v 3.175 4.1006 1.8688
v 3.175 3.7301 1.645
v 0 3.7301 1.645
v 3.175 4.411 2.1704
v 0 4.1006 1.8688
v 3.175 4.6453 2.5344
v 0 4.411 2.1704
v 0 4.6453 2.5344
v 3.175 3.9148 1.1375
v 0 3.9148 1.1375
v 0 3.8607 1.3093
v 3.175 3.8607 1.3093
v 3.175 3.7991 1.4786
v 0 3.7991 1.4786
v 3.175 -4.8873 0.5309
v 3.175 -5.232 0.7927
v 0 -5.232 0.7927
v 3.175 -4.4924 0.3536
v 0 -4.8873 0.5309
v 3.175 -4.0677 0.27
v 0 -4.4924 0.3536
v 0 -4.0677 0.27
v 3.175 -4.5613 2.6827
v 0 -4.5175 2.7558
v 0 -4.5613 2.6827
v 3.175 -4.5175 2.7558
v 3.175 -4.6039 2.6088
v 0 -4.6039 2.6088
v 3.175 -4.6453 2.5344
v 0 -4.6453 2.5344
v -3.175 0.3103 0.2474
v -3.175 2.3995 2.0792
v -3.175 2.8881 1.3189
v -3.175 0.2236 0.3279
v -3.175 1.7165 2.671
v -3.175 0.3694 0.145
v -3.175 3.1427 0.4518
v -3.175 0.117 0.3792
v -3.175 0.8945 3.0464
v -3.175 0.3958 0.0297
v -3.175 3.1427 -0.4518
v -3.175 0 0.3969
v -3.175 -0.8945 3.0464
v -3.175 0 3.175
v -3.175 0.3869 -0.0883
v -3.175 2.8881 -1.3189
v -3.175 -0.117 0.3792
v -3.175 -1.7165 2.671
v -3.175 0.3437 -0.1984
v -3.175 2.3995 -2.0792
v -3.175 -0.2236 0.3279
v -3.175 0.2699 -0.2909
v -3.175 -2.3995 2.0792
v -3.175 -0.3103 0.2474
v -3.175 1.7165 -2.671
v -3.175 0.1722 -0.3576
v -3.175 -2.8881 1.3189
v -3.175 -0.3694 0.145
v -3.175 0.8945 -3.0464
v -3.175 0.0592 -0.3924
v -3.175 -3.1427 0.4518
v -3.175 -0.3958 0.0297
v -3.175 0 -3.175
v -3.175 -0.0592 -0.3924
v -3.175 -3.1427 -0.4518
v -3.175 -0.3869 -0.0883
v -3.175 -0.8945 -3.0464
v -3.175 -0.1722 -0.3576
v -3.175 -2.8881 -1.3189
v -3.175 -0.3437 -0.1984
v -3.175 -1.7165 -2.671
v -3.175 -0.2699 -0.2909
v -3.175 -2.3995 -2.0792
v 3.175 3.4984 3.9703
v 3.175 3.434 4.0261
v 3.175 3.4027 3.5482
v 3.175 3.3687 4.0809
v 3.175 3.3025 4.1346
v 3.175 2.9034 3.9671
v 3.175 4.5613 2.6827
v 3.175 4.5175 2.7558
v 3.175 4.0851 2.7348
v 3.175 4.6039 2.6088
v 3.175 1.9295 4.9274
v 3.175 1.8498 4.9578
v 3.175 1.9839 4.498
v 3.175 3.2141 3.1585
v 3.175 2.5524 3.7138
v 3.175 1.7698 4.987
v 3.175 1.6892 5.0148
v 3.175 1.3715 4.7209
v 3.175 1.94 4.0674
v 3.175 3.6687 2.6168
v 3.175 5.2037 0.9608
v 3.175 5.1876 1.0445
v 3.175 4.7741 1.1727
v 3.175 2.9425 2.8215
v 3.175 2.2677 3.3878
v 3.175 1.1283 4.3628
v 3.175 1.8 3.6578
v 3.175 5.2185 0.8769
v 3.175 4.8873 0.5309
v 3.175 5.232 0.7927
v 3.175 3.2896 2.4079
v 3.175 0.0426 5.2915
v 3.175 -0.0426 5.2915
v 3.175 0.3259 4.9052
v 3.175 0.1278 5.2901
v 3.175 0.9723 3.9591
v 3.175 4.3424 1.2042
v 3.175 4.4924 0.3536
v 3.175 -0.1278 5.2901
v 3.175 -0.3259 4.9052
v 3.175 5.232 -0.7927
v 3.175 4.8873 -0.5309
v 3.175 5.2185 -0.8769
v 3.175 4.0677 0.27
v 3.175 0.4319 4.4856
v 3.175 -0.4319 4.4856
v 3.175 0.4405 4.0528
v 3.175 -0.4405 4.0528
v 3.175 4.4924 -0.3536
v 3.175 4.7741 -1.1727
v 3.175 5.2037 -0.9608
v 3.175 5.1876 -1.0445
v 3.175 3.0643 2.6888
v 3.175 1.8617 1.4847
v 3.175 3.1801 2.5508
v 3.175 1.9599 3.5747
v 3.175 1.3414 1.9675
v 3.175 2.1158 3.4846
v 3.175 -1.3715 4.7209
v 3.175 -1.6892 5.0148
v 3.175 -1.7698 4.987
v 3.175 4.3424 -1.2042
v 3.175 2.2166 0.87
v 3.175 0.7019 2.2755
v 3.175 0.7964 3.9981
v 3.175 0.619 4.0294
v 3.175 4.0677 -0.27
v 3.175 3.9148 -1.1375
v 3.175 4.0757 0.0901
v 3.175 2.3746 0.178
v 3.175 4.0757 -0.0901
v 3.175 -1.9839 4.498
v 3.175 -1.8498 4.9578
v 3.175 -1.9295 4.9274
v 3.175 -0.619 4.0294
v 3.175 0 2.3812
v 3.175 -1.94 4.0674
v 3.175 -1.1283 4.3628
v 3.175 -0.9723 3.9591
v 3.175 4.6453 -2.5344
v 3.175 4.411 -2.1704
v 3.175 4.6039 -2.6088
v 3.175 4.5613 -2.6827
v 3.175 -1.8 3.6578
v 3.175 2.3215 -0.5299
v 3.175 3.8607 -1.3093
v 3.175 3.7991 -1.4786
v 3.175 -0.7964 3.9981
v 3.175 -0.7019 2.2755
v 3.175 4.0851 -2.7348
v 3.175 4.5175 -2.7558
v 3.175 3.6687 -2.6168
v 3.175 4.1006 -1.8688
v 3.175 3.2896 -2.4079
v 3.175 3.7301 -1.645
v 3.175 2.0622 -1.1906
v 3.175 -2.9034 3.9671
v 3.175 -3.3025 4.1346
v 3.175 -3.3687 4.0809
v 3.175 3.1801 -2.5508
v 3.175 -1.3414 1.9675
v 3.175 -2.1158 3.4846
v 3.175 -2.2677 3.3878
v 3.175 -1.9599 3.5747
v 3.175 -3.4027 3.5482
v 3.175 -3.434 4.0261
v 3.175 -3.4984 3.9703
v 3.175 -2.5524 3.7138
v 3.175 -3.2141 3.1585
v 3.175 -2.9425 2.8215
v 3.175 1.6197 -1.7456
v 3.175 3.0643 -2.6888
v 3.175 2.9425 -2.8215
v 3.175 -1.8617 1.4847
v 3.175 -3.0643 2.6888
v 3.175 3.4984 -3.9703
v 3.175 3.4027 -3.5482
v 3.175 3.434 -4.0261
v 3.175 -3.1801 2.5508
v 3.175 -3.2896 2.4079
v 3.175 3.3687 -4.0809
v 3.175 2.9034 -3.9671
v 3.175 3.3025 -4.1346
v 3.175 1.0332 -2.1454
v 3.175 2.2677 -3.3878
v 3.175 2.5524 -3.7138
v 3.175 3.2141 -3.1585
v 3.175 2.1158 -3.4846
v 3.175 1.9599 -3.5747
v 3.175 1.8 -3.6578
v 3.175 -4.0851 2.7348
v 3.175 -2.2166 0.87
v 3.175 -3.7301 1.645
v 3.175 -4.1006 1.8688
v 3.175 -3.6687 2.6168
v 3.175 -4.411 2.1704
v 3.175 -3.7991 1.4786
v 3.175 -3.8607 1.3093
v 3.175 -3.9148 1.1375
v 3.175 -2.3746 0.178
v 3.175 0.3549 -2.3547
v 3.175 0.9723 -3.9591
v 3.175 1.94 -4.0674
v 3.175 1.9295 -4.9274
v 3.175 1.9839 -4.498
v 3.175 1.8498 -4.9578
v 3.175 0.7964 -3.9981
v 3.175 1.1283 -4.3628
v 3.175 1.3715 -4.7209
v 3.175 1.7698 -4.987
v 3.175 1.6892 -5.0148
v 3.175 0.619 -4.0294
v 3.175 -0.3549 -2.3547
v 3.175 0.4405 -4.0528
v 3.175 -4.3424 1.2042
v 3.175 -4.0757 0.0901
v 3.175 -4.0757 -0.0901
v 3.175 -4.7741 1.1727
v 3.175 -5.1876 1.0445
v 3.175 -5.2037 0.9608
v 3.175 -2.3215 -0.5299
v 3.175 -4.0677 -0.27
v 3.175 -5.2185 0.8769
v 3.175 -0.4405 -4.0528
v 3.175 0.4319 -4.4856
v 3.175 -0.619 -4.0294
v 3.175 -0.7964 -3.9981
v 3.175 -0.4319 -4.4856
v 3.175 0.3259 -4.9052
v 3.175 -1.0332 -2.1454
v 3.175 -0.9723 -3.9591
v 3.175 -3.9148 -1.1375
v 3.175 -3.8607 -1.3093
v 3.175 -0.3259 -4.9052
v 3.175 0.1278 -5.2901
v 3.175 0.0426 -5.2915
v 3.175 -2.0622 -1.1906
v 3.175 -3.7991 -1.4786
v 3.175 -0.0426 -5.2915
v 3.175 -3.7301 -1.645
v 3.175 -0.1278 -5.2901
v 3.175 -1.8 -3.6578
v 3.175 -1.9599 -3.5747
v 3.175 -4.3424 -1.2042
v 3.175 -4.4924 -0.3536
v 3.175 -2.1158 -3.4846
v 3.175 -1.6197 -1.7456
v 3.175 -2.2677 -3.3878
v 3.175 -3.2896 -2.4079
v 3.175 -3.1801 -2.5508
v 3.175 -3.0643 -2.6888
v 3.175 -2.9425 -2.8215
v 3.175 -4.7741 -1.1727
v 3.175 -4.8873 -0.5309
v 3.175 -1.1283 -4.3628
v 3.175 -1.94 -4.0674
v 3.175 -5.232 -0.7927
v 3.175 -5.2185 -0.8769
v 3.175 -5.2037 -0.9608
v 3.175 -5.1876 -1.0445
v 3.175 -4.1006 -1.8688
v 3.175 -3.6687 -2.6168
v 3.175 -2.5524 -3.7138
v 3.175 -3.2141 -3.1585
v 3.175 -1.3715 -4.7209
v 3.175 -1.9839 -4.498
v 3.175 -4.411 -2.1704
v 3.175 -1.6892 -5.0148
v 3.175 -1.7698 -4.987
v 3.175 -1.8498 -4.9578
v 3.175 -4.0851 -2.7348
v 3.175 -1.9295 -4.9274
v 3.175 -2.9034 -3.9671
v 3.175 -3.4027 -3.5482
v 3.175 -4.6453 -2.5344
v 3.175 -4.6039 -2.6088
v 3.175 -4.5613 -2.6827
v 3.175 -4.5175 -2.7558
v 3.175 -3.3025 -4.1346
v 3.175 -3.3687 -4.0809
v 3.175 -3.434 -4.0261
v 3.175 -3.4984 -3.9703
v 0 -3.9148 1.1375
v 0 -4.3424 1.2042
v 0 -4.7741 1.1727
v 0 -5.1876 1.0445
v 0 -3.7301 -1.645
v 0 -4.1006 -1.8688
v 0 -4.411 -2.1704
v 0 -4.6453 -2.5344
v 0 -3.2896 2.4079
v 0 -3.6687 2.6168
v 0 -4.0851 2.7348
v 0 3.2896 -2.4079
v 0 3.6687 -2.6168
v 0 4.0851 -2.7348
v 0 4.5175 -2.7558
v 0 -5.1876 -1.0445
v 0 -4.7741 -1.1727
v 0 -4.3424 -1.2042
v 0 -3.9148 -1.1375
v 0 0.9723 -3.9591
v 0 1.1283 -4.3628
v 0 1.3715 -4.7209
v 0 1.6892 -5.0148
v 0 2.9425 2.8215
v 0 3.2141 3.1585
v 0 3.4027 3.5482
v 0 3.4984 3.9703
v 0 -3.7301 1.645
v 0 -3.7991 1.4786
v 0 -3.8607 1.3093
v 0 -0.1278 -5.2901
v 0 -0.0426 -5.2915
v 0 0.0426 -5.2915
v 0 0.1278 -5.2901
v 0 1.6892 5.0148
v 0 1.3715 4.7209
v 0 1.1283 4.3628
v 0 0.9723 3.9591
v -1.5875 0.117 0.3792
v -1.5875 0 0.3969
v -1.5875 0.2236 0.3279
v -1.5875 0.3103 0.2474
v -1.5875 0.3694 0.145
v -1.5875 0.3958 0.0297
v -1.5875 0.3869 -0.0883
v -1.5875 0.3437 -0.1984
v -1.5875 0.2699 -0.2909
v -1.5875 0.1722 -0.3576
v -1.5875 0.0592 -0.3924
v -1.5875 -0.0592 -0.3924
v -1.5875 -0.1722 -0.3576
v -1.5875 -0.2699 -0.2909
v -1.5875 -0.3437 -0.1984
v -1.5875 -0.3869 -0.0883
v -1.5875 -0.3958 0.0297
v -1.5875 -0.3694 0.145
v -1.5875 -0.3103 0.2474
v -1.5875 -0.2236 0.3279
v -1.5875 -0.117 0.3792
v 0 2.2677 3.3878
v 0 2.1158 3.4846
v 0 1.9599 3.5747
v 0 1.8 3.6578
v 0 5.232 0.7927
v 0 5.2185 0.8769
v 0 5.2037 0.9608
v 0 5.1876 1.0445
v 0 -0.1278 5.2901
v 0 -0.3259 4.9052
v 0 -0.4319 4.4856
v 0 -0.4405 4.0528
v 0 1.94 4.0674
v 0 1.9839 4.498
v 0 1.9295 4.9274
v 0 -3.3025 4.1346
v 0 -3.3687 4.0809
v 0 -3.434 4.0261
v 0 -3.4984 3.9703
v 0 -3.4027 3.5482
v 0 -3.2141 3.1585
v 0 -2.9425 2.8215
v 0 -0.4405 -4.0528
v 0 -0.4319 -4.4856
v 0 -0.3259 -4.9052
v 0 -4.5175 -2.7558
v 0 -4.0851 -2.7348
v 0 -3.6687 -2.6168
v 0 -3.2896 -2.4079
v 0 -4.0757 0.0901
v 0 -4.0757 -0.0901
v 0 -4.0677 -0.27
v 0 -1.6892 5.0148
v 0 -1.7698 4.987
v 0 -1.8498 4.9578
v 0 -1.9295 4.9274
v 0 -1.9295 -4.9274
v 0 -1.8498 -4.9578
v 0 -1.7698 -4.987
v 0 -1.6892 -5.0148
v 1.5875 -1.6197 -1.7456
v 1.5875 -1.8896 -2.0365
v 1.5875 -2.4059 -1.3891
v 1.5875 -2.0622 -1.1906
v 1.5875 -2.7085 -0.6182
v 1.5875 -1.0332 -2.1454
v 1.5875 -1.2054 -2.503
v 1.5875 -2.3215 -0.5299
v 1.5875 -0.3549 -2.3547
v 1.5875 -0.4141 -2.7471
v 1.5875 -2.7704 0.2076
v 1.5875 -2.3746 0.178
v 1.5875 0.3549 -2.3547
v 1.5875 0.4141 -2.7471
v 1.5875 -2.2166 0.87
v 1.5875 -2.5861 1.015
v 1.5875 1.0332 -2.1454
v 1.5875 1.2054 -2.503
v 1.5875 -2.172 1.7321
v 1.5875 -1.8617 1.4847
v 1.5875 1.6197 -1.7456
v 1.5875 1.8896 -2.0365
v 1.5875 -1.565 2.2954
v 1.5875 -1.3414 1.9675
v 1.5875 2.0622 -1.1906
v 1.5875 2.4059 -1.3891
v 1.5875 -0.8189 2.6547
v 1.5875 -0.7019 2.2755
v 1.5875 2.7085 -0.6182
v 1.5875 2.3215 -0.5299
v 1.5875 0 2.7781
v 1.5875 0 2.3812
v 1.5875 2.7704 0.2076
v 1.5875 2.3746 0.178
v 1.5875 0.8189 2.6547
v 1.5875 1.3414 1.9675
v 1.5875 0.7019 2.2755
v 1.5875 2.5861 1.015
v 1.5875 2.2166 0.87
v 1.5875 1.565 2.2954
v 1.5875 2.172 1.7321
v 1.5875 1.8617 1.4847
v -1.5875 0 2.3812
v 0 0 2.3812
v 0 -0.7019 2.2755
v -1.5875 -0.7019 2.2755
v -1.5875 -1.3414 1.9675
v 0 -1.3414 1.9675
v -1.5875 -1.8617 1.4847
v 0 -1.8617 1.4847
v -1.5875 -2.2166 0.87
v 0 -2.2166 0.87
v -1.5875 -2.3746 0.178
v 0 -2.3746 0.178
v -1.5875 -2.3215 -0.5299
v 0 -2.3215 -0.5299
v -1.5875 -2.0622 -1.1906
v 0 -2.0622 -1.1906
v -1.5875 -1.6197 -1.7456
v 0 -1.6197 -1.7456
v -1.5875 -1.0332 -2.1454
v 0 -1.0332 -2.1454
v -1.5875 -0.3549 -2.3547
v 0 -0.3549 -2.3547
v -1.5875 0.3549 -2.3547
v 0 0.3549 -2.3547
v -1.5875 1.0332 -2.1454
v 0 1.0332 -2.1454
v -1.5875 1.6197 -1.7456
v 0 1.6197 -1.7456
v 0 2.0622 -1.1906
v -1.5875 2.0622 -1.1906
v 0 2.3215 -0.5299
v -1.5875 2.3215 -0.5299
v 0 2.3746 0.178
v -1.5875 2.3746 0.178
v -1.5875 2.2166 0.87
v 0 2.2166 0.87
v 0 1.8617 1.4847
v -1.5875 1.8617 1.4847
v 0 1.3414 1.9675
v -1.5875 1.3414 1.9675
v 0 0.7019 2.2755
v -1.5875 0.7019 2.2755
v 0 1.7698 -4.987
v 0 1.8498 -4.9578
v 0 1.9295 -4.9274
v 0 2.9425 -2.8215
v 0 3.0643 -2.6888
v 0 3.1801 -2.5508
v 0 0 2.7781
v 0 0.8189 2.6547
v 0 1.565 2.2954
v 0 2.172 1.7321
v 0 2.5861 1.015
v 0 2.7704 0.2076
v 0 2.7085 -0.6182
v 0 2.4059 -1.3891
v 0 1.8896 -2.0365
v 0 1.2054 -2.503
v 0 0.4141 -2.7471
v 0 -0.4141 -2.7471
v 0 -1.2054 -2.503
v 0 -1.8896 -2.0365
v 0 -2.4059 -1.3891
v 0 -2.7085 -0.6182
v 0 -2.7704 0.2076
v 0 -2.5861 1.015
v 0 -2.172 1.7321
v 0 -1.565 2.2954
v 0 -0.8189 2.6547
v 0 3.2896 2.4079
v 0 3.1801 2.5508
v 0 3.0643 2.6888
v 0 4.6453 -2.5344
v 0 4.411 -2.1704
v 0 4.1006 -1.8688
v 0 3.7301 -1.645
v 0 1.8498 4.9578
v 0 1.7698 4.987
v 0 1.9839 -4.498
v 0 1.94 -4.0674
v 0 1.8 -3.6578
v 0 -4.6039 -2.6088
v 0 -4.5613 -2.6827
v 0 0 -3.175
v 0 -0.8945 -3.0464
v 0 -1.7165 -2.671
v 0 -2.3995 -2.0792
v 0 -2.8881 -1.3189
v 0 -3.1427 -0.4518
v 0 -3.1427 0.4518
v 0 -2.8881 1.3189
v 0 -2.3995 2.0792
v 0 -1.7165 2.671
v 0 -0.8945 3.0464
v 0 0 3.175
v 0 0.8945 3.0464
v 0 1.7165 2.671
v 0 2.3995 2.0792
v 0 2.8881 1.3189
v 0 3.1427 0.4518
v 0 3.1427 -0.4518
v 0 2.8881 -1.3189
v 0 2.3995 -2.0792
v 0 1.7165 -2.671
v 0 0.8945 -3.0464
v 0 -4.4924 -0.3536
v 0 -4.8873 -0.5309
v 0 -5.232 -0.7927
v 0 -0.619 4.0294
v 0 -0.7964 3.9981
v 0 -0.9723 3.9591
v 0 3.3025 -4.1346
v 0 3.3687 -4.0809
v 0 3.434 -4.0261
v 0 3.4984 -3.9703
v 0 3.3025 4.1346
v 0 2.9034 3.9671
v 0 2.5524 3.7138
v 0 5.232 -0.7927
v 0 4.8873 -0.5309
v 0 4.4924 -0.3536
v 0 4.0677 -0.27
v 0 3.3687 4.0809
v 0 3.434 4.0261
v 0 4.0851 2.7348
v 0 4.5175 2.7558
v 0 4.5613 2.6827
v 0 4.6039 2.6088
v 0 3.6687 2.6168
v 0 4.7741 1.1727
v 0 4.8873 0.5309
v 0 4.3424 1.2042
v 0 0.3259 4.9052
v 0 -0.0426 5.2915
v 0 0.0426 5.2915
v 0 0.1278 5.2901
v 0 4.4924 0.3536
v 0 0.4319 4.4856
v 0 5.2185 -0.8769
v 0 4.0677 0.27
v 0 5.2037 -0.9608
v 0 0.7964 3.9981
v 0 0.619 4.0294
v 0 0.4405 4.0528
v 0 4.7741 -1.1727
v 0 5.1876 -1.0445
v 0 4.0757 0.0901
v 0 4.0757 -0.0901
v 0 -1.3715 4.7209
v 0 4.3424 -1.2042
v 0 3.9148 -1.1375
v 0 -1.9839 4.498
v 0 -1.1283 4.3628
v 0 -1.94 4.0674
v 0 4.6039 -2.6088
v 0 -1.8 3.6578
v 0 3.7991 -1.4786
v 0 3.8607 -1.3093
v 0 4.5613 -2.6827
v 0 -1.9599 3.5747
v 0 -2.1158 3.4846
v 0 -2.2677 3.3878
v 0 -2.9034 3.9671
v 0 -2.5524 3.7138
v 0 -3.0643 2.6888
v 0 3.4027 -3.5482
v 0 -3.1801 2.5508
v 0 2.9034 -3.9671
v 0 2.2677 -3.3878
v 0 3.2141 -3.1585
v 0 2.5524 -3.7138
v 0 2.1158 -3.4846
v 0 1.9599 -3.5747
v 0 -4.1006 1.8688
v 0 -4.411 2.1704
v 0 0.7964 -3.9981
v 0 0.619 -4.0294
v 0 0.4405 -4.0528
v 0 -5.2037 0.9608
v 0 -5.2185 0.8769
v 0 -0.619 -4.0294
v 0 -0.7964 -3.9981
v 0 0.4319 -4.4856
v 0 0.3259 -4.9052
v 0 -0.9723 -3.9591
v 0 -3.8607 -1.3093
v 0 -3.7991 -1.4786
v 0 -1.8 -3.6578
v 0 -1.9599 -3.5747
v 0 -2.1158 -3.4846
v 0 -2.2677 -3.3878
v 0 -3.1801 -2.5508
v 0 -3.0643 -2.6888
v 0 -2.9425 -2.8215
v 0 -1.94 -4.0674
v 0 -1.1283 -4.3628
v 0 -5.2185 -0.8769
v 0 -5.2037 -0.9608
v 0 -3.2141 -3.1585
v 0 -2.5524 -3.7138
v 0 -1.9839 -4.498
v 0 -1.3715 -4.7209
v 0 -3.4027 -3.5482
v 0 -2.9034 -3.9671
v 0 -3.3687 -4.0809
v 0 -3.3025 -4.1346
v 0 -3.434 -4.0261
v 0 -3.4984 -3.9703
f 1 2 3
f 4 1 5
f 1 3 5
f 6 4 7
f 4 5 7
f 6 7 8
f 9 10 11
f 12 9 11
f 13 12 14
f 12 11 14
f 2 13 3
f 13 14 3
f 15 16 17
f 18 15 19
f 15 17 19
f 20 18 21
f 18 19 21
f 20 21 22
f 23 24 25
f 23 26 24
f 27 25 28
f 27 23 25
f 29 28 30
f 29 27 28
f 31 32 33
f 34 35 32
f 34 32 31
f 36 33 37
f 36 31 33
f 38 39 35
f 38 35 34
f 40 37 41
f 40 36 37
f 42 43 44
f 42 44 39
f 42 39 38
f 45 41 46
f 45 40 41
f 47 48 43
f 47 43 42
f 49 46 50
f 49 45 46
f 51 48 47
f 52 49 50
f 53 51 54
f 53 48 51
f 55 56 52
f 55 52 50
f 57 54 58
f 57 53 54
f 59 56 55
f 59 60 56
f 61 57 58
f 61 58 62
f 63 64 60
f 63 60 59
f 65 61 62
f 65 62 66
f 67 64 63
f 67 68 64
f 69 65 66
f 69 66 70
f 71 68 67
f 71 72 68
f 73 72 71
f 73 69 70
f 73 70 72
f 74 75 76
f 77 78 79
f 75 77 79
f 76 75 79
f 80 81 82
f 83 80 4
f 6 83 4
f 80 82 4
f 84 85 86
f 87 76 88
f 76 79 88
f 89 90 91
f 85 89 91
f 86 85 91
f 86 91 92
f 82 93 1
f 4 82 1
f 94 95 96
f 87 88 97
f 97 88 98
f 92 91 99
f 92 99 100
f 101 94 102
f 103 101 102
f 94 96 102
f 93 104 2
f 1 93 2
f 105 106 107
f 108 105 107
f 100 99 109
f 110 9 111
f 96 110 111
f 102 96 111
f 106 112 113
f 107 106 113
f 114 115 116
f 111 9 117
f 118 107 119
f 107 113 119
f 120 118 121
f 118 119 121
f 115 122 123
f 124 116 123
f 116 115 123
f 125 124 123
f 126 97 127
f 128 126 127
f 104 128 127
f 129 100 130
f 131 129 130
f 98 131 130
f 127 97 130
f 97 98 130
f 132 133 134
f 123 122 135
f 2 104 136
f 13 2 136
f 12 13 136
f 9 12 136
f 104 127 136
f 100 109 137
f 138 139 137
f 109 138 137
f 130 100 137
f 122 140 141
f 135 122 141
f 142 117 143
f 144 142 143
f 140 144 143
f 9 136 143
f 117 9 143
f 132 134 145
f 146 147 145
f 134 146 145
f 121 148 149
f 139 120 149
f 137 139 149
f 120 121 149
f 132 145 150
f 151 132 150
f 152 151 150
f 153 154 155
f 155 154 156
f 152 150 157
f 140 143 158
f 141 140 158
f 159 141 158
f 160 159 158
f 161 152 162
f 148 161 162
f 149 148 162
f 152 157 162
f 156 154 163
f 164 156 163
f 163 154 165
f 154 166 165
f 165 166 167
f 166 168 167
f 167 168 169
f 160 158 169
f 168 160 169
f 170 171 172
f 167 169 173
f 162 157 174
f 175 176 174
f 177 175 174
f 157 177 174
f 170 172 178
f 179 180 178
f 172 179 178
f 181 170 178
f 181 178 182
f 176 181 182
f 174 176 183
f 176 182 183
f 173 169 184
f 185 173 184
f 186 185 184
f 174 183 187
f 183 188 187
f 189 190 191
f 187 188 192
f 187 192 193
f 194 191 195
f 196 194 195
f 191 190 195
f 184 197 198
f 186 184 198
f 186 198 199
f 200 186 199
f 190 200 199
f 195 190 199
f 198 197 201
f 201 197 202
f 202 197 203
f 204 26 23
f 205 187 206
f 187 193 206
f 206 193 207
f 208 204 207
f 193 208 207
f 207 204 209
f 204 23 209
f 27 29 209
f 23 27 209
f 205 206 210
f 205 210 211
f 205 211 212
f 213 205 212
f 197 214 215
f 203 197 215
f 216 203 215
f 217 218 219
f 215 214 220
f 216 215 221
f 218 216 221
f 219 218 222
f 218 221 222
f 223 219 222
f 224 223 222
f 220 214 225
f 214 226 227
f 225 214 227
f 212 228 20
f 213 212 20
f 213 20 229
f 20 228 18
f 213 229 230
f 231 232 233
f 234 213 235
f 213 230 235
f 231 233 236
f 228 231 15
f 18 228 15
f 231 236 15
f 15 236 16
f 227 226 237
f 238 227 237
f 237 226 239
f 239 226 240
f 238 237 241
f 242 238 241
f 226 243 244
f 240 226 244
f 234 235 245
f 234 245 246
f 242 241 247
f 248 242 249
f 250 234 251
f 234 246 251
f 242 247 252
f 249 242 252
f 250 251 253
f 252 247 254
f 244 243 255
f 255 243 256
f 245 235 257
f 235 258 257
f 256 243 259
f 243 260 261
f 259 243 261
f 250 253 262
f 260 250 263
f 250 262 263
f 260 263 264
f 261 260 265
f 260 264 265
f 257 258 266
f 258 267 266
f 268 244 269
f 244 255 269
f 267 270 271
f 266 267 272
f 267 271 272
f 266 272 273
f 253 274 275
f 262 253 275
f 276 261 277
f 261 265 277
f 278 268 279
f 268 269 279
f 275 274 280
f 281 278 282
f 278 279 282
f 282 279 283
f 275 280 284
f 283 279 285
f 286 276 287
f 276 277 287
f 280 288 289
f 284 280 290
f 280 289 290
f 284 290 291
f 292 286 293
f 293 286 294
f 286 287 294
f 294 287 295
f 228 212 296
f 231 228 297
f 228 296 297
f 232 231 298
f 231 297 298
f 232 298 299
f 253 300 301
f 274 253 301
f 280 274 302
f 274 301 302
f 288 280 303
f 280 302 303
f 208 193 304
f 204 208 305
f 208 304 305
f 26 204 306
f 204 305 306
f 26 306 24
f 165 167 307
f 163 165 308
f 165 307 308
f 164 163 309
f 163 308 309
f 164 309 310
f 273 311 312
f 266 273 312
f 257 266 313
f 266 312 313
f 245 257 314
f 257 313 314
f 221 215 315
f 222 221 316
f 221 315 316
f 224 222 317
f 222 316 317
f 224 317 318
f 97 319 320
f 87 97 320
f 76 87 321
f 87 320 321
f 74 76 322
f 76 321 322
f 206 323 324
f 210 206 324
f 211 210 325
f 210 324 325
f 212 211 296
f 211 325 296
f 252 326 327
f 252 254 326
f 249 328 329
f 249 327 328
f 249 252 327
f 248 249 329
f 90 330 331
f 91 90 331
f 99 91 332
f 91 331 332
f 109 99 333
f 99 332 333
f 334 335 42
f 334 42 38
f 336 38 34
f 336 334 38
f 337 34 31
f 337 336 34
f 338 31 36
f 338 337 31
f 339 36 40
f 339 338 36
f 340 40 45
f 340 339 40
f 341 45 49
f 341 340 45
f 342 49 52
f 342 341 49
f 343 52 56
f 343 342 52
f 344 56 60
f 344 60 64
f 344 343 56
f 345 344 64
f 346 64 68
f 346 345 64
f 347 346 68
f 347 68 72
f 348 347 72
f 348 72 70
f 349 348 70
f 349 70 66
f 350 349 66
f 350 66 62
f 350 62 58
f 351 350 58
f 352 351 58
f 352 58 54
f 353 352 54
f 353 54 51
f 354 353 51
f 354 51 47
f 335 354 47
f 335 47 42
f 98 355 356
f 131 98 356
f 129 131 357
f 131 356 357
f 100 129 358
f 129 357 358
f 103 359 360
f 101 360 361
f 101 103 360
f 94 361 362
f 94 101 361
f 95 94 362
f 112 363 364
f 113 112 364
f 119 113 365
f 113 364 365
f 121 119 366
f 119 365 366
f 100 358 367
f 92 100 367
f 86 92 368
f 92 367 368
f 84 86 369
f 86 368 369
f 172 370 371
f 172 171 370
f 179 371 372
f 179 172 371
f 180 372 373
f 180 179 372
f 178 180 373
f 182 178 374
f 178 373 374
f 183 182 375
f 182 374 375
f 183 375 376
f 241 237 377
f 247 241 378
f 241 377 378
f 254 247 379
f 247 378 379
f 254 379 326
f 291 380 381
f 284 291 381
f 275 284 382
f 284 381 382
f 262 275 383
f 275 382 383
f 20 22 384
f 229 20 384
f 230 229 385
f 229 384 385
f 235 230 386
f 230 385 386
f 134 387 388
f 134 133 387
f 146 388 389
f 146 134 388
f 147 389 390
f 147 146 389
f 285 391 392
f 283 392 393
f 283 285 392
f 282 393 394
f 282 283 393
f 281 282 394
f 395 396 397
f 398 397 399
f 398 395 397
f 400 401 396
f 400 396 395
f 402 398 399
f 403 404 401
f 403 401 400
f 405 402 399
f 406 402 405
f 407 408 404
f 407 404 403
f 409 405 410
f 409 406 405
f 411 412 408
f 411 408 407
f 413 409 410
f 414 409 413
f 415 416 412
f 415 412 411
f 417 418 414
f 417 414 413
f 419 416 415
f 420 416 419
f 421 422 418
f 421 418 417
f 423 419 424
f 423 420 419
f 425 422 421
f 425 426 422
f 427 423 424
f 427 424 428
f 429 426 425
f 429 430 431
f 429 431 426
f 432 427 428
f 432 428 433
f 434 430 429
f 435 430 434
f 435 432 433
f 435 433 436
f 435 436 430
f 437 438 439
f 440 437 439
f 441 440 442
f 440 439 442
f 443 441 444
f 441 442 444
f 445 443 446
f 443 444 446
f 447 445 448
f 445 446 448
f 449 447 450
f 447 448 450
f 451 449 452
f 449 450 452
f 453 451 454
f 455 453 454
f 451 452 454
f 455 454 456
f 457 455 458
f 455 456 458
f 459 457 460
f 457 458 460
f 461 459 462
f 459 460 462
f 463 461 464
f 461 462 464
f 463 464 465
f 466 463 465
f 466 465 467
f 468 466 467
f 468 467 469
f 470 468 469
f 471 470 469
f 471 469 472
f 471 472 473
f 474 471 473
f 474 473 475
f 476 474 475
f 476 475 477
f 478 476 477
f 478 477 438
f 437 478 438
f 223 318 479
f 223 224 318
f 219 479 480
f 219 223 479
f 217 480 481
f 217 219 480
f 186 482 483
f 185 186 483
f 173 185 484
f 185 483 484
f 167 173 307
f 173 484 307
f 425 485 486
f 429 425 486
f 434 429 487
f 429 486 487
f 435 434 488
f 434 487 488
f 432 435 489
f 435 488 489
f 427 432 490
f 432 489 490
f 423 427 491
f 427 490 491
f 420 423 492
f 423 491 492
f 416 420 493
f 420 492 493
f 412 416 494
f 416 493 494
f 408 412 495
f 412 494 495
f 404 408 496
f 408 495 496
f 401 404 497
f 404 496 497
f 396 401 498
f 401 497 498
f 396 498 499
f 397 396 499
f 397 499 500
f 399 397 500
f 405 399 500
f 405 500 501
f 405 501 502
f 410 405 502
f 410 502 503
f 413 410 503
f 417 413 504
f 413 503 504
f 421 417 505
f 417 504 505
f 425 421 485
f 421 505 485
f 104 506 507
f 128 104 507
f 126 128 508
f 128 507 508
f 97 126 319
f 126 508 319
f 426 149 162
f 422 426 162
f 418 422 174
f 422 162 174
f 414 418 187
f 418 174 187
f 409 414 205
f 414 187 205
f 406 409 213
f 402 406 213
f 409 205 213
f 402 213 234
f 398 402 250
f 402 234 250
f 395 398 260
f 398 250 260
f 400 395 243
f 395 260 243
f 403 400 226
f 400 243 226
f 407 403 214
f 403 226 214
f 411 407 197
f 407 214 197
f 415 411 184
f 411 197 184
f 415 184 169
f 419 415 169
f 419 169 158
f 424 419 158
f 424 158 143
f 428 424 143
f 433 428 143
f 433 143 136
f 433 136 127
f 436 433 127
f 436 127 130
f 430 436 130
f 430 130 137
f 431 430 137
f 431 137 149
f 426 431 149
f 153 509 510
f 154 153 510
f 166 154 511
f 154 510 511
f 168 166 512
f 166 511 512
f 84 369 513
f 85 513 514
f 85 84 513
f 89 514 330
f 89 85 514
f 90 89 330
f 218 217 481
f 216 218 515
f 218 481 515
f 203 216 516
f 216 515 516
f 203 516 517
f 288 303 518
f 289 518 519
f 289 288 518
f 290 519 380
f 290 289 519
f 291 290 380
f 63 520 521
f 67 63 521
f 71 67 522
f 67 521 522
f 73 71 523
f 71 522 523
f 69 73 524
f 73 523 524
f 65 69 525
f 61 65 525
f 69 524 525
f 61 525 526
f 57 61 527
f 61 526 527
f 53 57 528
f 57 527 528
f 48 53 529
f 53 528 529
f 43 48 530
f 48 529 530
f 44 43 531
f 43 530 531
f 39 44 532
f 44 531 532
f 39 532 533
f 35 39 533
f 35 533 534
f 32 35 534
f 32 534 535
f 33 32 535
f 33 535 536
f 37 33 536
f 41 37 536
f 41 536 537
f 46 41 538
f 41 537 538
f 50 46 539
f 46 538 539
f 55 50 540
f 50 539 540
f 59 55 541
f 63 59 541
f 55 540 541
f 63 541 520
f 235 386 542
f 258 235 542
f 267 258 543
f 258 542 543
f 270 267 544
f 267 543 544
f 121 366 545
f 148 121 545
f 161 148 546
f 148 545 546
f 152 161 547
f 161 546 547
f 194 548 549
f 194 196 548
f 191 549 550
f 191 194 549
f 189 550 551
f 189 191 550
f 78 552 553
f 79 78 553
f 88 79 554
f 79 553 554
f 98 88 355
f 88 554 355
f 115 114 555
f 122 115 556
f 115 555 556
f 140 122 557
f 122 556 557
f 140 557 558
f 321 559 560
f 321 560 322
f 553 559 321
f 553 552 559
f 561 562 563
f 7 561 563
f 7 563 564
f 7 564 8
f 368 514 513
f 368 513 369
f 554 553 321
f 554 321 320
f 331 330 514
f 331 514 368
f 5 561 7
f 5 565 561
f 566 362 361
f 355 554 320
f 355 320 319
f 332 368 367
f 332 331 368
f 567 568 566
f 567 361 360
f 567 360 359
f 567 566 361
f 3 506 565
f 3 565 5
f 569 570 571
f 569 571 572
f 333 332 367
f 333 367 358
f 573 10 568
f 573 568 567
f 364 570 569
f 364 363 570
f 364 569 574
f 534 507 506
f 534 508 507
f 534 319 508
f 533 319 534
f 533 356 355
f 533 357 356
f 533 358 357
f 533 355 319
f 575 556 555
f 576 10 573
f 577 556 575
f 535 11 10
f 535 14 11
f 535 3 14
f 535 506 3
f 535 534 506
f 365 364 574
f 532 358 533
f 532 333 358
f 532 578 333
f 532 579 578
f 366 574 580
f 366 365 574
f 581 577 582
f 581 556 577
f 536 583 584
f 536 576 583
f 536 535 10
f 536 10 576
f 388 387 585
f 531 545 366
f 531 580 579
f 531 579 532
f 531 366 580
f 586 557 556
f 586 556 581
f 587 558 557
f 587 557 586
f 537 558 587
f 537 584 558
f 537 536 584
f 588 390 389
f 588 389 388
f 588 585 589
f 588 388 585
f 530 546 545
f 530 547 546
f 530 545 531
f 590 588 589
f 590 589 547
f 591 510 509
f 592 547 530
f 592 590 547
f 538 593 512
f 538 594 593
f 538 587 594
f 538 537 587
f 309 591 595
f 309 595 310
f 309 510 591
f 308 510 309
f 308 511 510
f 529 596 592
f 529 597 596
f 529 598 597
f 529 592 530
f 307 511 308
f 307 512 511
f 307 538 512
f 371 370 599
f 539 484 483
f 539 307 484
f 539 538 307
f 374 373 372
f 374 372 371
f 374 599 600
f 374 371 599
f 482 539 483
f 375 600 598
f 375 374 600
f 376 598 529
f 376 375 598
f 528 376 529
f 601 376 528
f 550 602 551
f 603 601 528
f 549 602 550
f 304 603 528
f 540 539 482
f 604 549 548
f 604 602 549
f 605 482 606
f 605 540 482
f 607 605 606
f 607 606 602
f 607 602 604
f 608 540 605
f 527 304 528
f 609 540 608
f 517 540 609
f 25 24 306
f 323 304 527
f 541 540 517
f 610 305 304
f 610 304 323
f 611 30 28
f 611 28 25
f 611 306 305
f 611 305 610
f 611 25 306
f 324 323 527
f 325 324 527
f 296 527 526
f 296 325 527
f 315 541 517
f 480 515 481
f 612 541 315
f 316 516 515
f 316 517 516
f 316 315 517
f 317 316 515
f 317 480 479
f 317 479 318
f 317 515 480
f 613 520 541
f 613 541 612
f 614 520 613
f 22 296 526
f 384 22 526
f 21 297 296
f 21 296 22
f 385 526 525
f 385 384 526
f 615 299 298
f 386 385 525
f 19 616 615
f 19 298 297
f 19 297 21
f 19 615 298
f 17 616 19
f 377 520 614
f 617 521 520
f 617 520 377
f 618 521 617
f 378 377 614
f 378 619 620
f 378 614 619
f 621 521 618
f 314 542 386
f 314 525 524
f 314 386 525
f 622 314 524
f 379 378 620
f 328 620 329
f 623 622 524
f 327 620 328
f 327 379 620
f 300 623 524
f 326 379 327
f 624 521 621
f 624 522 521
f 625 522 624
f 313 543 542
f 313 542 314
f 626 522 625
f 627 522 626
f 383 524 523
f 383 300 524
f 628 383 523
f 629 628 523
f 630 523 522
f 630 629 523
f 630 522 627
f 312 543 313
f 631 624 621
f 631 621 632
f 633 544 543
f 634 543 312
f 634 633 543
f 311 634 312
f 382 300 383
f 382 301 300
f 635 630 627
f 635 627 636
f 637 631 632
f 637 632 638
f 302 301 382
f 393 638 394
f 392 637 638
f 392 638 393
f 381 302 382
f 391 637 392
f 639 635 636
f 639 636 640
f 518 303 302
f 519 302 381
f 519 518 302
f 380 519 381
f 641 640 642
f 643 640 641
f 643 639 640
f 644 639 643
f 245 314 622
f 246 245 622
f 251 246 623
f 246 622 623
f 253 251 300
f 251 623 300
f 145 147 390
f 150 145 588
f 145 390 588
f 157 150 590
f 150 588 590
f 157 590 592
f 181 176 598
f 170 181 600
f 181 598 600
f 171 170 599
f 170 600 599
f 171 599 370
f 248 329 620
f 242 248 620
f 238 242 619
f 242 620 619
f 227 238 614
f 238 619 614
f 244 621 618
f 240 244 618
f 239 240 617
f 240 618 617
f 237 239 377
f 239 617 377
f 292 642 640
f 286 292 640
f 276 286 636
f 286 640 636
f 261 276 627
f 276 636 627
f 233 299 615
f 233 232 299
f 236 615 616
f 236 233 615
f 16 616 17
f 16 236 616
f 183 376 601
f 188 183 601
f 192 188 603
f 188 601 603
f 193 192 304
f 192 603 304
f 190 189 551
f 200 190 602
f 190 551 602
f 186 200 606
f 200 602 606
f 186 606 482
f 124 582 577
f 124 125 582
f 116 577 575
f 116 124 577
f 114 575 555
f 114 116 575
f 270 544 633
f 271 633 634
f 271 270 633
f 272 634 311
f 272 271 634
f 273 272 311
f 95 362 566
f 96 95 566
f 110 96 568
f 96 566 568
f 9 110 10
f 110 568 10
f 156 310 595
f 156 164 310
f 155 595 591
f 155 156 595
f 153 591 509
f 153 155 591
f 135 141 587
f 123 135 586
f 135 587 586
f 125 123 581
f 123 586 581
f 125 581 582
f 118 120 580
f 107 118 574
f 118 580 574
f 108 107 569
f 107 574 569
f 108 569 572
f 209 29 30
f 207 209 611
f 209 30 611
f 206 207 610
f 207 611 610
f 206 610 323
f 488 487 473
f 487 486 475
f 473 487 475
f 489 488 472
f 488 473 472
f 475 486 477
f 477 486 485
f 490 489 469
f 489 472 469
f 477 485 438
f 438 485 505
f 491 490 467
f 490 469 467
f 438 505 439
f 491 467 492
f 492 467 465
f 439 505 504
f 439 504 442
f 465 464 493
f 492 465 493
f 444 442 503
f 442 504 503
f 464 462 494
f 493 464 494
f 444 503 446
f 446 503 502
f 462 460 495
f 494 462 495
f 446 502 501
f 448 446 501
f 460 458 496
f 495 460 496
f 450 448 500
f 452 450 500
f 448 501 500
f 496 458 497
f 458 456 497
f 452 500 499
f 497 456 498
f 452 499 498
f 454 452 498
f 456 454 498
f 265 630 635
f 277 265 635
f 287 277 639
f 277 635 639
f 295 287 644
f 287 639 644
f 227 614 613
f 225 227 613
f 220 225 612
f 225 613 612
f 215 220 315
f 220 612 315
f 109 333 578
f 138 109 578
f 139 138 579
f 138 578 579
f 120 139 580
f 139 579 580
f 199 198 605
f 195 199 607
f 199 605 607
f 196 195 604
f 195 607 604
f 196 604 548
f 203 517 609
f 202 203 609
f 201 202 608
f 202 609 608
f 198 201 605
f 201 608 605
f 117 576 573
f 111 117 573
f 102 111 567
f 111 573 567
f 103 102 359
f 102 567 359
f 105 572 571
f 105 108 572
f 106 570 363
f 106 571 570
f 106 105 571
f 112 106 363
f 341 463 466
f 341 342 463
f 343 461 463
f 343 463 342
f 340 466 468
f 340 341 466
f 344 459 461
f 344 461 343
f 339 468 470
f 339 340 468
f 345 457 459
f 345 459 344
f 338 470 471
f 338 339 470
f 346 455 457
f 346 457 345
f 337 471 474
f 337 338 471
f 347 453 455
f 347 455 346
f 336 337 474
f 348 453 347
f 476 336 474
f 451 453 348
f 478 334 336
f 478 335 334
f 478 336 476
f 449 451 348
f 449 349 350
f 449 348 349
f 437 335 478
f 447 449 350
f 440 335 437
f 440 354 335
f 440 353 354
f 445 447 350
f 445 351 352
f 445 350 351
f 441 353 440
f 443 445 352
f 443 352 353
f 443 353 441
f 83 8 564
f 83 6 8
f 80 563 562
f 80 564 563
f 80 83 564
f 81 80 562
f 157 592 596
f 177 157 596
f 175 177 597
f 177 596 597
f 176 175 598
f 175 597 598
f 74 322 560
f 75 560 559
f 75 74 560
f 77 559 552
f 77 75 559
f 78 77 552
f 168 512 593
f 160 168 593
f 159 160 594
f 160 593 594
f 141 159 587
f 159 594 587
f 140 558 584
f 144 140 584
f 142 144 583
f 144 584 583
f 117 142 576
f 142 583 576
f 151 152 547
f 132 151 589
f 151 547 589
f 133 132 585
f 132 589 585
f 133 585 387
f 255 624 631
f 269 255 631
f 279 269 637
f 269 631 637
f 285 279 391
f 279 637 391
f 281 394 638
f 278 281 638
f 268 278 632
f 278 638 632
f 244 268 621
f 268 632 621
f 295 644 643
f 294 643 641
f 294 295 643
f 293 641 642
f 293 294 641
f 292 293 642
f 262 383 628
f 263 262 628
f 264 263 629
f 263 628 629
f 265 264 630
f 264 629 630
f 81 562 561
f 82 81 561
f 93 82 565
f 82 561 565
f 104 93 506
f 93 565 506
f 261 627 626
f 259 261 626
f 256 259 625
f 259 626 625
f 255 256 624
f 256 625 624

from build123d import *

# Parameters (mm, degrees)
BASPROSKE_W         = 3.175
BASPROSKE_H         = 5.291666667
TOOTHCUT_DEPTH      = 9.129212583
TEETHCUTS_COUNT     = 18
TEETHCUTS_ANGLE     = 340
BORSKE_R            = 0.396875
BORE_DEPTH          = 50.8009144
SKETCH1_R           = 2.778125
CUT_EXTRUDE2_DEPTH  = 1.5875
SKETCH3_R           = 3.175
SKETCH3_R_2         = 0.396875
BOSS_EXTRUDE1_DEPTH = 3.175
SKETCH4_R           = 2.38125
CUT_EXTRUDE3_DEPTH  = 4.7625


with BuildPart() as part:
    # BasProSke → Base-Revolve (revolve)
    with BuildSketch(Plane(origin=(0, 0, 0), x_dir=(1, 0, 0), z_dir=(0, 1, 0)), mode=Mode.PRIVATE) as base_revolve_sk:
        with Locations((1.5875, 2.645833334)):
            Rectangle(BASPROSKE_W, BASPROSKE_H)
    revolve(base_revolve_sk.sketch.rotate(Axis((-10, 0, 0), (1, 0, 0)), 180), axis=Axis((-10, 0, 0), (1, 0, 0)))

    # TooCutSke → ToothCut (cut, through all)
    with BuildSketch(Plane(origin=(0, 0, 0), x_dir=(0, 0, -1), z_dir=(1, 0, 0))):
        with BuildLine():
            ThreePointArc((0.270003318, 4.067748898), (0, 4.0767), (-0.270003318, 4.067748898))
            ThreePointArc((-0.270003318, 4.067748898), (-0.437425956, 4.709129954), (-0.814487039, 5.254313352))
            ThreePointArc((-0.814487039, 5.254313352), (0, 5.317066667), (0.814487039, 5.254313352))
            ThreePointArc((0.814487039, 5.254313352), (0.437425956, 4.709129954), (0.270003318, 4.067748898))
        make_face()
    toothcut = extrude(amount=TOOTHCUT_DEPTH, mode=Mode.SUBTRACT)

    # TeethCuts: ToothCut ×18 about axis
    teethcuts_axis = Axis((-10, 0, 0), (1, 0, 0))
    for i in range(1, TEETHCUTS_COUNT):
        add(toothcut.rotate(teethcuts_axis, i * TEETHCUTS_ANGLE / (TEETHCUTS_COUNT - 1)), mode=Mode.SUBTRACT)

    # BorSke → Bore (cut, symmetric)
    with BuildSketch(Plane(origin=(0, 0, 0), x_dir=(0, 0, -1), z_dir=(1, 0, 0))):
        with Locations(Location((0, 0, 0), (0, 0, 180))):
            Circle(BORSKE_R)
    extrude(amount=BORE_DEPTH, both=True, mode=Mode.SUBTRACT)

    # Sketch1 → Cut-Extrude2 (cut)
    with BuildSketch(Plane.ZY):
        Circle(SKETCH1_R)
    extrude(amount=-CUT_EXTRUDE2_DEPTH, mode=Mode.SUBTRACT)

    # Sketch3 → Boss-Extrude1 (add)
    with BuildSketch(Plane.ZY):
        with Locations(Location((0, 0, 0), (0, 0, 180))):
            Circle(SKETCH3_R)
        Circle(SKETCH3_R_2, mode=Mode.SUBTRACT)
    extrude(amount=BOSS_EXTRUDE1_DEPTH)

    # Sketch4 → Cut-Extrude3 (cut)
    with BuildSketch(Plane(origin=(3.175, 0, 0), x_dir=(0, 0, -1), z_dir=(1, 0, 0))):
        with Locations(Location((0, 0, 0), (0, 0, 180))):
            Circle(SKETCH4_R)
    extrude(amount=-CUT_EXTRUDE3_DEPTH, mode=Mode.SUBTRACT)


solid = part.part
